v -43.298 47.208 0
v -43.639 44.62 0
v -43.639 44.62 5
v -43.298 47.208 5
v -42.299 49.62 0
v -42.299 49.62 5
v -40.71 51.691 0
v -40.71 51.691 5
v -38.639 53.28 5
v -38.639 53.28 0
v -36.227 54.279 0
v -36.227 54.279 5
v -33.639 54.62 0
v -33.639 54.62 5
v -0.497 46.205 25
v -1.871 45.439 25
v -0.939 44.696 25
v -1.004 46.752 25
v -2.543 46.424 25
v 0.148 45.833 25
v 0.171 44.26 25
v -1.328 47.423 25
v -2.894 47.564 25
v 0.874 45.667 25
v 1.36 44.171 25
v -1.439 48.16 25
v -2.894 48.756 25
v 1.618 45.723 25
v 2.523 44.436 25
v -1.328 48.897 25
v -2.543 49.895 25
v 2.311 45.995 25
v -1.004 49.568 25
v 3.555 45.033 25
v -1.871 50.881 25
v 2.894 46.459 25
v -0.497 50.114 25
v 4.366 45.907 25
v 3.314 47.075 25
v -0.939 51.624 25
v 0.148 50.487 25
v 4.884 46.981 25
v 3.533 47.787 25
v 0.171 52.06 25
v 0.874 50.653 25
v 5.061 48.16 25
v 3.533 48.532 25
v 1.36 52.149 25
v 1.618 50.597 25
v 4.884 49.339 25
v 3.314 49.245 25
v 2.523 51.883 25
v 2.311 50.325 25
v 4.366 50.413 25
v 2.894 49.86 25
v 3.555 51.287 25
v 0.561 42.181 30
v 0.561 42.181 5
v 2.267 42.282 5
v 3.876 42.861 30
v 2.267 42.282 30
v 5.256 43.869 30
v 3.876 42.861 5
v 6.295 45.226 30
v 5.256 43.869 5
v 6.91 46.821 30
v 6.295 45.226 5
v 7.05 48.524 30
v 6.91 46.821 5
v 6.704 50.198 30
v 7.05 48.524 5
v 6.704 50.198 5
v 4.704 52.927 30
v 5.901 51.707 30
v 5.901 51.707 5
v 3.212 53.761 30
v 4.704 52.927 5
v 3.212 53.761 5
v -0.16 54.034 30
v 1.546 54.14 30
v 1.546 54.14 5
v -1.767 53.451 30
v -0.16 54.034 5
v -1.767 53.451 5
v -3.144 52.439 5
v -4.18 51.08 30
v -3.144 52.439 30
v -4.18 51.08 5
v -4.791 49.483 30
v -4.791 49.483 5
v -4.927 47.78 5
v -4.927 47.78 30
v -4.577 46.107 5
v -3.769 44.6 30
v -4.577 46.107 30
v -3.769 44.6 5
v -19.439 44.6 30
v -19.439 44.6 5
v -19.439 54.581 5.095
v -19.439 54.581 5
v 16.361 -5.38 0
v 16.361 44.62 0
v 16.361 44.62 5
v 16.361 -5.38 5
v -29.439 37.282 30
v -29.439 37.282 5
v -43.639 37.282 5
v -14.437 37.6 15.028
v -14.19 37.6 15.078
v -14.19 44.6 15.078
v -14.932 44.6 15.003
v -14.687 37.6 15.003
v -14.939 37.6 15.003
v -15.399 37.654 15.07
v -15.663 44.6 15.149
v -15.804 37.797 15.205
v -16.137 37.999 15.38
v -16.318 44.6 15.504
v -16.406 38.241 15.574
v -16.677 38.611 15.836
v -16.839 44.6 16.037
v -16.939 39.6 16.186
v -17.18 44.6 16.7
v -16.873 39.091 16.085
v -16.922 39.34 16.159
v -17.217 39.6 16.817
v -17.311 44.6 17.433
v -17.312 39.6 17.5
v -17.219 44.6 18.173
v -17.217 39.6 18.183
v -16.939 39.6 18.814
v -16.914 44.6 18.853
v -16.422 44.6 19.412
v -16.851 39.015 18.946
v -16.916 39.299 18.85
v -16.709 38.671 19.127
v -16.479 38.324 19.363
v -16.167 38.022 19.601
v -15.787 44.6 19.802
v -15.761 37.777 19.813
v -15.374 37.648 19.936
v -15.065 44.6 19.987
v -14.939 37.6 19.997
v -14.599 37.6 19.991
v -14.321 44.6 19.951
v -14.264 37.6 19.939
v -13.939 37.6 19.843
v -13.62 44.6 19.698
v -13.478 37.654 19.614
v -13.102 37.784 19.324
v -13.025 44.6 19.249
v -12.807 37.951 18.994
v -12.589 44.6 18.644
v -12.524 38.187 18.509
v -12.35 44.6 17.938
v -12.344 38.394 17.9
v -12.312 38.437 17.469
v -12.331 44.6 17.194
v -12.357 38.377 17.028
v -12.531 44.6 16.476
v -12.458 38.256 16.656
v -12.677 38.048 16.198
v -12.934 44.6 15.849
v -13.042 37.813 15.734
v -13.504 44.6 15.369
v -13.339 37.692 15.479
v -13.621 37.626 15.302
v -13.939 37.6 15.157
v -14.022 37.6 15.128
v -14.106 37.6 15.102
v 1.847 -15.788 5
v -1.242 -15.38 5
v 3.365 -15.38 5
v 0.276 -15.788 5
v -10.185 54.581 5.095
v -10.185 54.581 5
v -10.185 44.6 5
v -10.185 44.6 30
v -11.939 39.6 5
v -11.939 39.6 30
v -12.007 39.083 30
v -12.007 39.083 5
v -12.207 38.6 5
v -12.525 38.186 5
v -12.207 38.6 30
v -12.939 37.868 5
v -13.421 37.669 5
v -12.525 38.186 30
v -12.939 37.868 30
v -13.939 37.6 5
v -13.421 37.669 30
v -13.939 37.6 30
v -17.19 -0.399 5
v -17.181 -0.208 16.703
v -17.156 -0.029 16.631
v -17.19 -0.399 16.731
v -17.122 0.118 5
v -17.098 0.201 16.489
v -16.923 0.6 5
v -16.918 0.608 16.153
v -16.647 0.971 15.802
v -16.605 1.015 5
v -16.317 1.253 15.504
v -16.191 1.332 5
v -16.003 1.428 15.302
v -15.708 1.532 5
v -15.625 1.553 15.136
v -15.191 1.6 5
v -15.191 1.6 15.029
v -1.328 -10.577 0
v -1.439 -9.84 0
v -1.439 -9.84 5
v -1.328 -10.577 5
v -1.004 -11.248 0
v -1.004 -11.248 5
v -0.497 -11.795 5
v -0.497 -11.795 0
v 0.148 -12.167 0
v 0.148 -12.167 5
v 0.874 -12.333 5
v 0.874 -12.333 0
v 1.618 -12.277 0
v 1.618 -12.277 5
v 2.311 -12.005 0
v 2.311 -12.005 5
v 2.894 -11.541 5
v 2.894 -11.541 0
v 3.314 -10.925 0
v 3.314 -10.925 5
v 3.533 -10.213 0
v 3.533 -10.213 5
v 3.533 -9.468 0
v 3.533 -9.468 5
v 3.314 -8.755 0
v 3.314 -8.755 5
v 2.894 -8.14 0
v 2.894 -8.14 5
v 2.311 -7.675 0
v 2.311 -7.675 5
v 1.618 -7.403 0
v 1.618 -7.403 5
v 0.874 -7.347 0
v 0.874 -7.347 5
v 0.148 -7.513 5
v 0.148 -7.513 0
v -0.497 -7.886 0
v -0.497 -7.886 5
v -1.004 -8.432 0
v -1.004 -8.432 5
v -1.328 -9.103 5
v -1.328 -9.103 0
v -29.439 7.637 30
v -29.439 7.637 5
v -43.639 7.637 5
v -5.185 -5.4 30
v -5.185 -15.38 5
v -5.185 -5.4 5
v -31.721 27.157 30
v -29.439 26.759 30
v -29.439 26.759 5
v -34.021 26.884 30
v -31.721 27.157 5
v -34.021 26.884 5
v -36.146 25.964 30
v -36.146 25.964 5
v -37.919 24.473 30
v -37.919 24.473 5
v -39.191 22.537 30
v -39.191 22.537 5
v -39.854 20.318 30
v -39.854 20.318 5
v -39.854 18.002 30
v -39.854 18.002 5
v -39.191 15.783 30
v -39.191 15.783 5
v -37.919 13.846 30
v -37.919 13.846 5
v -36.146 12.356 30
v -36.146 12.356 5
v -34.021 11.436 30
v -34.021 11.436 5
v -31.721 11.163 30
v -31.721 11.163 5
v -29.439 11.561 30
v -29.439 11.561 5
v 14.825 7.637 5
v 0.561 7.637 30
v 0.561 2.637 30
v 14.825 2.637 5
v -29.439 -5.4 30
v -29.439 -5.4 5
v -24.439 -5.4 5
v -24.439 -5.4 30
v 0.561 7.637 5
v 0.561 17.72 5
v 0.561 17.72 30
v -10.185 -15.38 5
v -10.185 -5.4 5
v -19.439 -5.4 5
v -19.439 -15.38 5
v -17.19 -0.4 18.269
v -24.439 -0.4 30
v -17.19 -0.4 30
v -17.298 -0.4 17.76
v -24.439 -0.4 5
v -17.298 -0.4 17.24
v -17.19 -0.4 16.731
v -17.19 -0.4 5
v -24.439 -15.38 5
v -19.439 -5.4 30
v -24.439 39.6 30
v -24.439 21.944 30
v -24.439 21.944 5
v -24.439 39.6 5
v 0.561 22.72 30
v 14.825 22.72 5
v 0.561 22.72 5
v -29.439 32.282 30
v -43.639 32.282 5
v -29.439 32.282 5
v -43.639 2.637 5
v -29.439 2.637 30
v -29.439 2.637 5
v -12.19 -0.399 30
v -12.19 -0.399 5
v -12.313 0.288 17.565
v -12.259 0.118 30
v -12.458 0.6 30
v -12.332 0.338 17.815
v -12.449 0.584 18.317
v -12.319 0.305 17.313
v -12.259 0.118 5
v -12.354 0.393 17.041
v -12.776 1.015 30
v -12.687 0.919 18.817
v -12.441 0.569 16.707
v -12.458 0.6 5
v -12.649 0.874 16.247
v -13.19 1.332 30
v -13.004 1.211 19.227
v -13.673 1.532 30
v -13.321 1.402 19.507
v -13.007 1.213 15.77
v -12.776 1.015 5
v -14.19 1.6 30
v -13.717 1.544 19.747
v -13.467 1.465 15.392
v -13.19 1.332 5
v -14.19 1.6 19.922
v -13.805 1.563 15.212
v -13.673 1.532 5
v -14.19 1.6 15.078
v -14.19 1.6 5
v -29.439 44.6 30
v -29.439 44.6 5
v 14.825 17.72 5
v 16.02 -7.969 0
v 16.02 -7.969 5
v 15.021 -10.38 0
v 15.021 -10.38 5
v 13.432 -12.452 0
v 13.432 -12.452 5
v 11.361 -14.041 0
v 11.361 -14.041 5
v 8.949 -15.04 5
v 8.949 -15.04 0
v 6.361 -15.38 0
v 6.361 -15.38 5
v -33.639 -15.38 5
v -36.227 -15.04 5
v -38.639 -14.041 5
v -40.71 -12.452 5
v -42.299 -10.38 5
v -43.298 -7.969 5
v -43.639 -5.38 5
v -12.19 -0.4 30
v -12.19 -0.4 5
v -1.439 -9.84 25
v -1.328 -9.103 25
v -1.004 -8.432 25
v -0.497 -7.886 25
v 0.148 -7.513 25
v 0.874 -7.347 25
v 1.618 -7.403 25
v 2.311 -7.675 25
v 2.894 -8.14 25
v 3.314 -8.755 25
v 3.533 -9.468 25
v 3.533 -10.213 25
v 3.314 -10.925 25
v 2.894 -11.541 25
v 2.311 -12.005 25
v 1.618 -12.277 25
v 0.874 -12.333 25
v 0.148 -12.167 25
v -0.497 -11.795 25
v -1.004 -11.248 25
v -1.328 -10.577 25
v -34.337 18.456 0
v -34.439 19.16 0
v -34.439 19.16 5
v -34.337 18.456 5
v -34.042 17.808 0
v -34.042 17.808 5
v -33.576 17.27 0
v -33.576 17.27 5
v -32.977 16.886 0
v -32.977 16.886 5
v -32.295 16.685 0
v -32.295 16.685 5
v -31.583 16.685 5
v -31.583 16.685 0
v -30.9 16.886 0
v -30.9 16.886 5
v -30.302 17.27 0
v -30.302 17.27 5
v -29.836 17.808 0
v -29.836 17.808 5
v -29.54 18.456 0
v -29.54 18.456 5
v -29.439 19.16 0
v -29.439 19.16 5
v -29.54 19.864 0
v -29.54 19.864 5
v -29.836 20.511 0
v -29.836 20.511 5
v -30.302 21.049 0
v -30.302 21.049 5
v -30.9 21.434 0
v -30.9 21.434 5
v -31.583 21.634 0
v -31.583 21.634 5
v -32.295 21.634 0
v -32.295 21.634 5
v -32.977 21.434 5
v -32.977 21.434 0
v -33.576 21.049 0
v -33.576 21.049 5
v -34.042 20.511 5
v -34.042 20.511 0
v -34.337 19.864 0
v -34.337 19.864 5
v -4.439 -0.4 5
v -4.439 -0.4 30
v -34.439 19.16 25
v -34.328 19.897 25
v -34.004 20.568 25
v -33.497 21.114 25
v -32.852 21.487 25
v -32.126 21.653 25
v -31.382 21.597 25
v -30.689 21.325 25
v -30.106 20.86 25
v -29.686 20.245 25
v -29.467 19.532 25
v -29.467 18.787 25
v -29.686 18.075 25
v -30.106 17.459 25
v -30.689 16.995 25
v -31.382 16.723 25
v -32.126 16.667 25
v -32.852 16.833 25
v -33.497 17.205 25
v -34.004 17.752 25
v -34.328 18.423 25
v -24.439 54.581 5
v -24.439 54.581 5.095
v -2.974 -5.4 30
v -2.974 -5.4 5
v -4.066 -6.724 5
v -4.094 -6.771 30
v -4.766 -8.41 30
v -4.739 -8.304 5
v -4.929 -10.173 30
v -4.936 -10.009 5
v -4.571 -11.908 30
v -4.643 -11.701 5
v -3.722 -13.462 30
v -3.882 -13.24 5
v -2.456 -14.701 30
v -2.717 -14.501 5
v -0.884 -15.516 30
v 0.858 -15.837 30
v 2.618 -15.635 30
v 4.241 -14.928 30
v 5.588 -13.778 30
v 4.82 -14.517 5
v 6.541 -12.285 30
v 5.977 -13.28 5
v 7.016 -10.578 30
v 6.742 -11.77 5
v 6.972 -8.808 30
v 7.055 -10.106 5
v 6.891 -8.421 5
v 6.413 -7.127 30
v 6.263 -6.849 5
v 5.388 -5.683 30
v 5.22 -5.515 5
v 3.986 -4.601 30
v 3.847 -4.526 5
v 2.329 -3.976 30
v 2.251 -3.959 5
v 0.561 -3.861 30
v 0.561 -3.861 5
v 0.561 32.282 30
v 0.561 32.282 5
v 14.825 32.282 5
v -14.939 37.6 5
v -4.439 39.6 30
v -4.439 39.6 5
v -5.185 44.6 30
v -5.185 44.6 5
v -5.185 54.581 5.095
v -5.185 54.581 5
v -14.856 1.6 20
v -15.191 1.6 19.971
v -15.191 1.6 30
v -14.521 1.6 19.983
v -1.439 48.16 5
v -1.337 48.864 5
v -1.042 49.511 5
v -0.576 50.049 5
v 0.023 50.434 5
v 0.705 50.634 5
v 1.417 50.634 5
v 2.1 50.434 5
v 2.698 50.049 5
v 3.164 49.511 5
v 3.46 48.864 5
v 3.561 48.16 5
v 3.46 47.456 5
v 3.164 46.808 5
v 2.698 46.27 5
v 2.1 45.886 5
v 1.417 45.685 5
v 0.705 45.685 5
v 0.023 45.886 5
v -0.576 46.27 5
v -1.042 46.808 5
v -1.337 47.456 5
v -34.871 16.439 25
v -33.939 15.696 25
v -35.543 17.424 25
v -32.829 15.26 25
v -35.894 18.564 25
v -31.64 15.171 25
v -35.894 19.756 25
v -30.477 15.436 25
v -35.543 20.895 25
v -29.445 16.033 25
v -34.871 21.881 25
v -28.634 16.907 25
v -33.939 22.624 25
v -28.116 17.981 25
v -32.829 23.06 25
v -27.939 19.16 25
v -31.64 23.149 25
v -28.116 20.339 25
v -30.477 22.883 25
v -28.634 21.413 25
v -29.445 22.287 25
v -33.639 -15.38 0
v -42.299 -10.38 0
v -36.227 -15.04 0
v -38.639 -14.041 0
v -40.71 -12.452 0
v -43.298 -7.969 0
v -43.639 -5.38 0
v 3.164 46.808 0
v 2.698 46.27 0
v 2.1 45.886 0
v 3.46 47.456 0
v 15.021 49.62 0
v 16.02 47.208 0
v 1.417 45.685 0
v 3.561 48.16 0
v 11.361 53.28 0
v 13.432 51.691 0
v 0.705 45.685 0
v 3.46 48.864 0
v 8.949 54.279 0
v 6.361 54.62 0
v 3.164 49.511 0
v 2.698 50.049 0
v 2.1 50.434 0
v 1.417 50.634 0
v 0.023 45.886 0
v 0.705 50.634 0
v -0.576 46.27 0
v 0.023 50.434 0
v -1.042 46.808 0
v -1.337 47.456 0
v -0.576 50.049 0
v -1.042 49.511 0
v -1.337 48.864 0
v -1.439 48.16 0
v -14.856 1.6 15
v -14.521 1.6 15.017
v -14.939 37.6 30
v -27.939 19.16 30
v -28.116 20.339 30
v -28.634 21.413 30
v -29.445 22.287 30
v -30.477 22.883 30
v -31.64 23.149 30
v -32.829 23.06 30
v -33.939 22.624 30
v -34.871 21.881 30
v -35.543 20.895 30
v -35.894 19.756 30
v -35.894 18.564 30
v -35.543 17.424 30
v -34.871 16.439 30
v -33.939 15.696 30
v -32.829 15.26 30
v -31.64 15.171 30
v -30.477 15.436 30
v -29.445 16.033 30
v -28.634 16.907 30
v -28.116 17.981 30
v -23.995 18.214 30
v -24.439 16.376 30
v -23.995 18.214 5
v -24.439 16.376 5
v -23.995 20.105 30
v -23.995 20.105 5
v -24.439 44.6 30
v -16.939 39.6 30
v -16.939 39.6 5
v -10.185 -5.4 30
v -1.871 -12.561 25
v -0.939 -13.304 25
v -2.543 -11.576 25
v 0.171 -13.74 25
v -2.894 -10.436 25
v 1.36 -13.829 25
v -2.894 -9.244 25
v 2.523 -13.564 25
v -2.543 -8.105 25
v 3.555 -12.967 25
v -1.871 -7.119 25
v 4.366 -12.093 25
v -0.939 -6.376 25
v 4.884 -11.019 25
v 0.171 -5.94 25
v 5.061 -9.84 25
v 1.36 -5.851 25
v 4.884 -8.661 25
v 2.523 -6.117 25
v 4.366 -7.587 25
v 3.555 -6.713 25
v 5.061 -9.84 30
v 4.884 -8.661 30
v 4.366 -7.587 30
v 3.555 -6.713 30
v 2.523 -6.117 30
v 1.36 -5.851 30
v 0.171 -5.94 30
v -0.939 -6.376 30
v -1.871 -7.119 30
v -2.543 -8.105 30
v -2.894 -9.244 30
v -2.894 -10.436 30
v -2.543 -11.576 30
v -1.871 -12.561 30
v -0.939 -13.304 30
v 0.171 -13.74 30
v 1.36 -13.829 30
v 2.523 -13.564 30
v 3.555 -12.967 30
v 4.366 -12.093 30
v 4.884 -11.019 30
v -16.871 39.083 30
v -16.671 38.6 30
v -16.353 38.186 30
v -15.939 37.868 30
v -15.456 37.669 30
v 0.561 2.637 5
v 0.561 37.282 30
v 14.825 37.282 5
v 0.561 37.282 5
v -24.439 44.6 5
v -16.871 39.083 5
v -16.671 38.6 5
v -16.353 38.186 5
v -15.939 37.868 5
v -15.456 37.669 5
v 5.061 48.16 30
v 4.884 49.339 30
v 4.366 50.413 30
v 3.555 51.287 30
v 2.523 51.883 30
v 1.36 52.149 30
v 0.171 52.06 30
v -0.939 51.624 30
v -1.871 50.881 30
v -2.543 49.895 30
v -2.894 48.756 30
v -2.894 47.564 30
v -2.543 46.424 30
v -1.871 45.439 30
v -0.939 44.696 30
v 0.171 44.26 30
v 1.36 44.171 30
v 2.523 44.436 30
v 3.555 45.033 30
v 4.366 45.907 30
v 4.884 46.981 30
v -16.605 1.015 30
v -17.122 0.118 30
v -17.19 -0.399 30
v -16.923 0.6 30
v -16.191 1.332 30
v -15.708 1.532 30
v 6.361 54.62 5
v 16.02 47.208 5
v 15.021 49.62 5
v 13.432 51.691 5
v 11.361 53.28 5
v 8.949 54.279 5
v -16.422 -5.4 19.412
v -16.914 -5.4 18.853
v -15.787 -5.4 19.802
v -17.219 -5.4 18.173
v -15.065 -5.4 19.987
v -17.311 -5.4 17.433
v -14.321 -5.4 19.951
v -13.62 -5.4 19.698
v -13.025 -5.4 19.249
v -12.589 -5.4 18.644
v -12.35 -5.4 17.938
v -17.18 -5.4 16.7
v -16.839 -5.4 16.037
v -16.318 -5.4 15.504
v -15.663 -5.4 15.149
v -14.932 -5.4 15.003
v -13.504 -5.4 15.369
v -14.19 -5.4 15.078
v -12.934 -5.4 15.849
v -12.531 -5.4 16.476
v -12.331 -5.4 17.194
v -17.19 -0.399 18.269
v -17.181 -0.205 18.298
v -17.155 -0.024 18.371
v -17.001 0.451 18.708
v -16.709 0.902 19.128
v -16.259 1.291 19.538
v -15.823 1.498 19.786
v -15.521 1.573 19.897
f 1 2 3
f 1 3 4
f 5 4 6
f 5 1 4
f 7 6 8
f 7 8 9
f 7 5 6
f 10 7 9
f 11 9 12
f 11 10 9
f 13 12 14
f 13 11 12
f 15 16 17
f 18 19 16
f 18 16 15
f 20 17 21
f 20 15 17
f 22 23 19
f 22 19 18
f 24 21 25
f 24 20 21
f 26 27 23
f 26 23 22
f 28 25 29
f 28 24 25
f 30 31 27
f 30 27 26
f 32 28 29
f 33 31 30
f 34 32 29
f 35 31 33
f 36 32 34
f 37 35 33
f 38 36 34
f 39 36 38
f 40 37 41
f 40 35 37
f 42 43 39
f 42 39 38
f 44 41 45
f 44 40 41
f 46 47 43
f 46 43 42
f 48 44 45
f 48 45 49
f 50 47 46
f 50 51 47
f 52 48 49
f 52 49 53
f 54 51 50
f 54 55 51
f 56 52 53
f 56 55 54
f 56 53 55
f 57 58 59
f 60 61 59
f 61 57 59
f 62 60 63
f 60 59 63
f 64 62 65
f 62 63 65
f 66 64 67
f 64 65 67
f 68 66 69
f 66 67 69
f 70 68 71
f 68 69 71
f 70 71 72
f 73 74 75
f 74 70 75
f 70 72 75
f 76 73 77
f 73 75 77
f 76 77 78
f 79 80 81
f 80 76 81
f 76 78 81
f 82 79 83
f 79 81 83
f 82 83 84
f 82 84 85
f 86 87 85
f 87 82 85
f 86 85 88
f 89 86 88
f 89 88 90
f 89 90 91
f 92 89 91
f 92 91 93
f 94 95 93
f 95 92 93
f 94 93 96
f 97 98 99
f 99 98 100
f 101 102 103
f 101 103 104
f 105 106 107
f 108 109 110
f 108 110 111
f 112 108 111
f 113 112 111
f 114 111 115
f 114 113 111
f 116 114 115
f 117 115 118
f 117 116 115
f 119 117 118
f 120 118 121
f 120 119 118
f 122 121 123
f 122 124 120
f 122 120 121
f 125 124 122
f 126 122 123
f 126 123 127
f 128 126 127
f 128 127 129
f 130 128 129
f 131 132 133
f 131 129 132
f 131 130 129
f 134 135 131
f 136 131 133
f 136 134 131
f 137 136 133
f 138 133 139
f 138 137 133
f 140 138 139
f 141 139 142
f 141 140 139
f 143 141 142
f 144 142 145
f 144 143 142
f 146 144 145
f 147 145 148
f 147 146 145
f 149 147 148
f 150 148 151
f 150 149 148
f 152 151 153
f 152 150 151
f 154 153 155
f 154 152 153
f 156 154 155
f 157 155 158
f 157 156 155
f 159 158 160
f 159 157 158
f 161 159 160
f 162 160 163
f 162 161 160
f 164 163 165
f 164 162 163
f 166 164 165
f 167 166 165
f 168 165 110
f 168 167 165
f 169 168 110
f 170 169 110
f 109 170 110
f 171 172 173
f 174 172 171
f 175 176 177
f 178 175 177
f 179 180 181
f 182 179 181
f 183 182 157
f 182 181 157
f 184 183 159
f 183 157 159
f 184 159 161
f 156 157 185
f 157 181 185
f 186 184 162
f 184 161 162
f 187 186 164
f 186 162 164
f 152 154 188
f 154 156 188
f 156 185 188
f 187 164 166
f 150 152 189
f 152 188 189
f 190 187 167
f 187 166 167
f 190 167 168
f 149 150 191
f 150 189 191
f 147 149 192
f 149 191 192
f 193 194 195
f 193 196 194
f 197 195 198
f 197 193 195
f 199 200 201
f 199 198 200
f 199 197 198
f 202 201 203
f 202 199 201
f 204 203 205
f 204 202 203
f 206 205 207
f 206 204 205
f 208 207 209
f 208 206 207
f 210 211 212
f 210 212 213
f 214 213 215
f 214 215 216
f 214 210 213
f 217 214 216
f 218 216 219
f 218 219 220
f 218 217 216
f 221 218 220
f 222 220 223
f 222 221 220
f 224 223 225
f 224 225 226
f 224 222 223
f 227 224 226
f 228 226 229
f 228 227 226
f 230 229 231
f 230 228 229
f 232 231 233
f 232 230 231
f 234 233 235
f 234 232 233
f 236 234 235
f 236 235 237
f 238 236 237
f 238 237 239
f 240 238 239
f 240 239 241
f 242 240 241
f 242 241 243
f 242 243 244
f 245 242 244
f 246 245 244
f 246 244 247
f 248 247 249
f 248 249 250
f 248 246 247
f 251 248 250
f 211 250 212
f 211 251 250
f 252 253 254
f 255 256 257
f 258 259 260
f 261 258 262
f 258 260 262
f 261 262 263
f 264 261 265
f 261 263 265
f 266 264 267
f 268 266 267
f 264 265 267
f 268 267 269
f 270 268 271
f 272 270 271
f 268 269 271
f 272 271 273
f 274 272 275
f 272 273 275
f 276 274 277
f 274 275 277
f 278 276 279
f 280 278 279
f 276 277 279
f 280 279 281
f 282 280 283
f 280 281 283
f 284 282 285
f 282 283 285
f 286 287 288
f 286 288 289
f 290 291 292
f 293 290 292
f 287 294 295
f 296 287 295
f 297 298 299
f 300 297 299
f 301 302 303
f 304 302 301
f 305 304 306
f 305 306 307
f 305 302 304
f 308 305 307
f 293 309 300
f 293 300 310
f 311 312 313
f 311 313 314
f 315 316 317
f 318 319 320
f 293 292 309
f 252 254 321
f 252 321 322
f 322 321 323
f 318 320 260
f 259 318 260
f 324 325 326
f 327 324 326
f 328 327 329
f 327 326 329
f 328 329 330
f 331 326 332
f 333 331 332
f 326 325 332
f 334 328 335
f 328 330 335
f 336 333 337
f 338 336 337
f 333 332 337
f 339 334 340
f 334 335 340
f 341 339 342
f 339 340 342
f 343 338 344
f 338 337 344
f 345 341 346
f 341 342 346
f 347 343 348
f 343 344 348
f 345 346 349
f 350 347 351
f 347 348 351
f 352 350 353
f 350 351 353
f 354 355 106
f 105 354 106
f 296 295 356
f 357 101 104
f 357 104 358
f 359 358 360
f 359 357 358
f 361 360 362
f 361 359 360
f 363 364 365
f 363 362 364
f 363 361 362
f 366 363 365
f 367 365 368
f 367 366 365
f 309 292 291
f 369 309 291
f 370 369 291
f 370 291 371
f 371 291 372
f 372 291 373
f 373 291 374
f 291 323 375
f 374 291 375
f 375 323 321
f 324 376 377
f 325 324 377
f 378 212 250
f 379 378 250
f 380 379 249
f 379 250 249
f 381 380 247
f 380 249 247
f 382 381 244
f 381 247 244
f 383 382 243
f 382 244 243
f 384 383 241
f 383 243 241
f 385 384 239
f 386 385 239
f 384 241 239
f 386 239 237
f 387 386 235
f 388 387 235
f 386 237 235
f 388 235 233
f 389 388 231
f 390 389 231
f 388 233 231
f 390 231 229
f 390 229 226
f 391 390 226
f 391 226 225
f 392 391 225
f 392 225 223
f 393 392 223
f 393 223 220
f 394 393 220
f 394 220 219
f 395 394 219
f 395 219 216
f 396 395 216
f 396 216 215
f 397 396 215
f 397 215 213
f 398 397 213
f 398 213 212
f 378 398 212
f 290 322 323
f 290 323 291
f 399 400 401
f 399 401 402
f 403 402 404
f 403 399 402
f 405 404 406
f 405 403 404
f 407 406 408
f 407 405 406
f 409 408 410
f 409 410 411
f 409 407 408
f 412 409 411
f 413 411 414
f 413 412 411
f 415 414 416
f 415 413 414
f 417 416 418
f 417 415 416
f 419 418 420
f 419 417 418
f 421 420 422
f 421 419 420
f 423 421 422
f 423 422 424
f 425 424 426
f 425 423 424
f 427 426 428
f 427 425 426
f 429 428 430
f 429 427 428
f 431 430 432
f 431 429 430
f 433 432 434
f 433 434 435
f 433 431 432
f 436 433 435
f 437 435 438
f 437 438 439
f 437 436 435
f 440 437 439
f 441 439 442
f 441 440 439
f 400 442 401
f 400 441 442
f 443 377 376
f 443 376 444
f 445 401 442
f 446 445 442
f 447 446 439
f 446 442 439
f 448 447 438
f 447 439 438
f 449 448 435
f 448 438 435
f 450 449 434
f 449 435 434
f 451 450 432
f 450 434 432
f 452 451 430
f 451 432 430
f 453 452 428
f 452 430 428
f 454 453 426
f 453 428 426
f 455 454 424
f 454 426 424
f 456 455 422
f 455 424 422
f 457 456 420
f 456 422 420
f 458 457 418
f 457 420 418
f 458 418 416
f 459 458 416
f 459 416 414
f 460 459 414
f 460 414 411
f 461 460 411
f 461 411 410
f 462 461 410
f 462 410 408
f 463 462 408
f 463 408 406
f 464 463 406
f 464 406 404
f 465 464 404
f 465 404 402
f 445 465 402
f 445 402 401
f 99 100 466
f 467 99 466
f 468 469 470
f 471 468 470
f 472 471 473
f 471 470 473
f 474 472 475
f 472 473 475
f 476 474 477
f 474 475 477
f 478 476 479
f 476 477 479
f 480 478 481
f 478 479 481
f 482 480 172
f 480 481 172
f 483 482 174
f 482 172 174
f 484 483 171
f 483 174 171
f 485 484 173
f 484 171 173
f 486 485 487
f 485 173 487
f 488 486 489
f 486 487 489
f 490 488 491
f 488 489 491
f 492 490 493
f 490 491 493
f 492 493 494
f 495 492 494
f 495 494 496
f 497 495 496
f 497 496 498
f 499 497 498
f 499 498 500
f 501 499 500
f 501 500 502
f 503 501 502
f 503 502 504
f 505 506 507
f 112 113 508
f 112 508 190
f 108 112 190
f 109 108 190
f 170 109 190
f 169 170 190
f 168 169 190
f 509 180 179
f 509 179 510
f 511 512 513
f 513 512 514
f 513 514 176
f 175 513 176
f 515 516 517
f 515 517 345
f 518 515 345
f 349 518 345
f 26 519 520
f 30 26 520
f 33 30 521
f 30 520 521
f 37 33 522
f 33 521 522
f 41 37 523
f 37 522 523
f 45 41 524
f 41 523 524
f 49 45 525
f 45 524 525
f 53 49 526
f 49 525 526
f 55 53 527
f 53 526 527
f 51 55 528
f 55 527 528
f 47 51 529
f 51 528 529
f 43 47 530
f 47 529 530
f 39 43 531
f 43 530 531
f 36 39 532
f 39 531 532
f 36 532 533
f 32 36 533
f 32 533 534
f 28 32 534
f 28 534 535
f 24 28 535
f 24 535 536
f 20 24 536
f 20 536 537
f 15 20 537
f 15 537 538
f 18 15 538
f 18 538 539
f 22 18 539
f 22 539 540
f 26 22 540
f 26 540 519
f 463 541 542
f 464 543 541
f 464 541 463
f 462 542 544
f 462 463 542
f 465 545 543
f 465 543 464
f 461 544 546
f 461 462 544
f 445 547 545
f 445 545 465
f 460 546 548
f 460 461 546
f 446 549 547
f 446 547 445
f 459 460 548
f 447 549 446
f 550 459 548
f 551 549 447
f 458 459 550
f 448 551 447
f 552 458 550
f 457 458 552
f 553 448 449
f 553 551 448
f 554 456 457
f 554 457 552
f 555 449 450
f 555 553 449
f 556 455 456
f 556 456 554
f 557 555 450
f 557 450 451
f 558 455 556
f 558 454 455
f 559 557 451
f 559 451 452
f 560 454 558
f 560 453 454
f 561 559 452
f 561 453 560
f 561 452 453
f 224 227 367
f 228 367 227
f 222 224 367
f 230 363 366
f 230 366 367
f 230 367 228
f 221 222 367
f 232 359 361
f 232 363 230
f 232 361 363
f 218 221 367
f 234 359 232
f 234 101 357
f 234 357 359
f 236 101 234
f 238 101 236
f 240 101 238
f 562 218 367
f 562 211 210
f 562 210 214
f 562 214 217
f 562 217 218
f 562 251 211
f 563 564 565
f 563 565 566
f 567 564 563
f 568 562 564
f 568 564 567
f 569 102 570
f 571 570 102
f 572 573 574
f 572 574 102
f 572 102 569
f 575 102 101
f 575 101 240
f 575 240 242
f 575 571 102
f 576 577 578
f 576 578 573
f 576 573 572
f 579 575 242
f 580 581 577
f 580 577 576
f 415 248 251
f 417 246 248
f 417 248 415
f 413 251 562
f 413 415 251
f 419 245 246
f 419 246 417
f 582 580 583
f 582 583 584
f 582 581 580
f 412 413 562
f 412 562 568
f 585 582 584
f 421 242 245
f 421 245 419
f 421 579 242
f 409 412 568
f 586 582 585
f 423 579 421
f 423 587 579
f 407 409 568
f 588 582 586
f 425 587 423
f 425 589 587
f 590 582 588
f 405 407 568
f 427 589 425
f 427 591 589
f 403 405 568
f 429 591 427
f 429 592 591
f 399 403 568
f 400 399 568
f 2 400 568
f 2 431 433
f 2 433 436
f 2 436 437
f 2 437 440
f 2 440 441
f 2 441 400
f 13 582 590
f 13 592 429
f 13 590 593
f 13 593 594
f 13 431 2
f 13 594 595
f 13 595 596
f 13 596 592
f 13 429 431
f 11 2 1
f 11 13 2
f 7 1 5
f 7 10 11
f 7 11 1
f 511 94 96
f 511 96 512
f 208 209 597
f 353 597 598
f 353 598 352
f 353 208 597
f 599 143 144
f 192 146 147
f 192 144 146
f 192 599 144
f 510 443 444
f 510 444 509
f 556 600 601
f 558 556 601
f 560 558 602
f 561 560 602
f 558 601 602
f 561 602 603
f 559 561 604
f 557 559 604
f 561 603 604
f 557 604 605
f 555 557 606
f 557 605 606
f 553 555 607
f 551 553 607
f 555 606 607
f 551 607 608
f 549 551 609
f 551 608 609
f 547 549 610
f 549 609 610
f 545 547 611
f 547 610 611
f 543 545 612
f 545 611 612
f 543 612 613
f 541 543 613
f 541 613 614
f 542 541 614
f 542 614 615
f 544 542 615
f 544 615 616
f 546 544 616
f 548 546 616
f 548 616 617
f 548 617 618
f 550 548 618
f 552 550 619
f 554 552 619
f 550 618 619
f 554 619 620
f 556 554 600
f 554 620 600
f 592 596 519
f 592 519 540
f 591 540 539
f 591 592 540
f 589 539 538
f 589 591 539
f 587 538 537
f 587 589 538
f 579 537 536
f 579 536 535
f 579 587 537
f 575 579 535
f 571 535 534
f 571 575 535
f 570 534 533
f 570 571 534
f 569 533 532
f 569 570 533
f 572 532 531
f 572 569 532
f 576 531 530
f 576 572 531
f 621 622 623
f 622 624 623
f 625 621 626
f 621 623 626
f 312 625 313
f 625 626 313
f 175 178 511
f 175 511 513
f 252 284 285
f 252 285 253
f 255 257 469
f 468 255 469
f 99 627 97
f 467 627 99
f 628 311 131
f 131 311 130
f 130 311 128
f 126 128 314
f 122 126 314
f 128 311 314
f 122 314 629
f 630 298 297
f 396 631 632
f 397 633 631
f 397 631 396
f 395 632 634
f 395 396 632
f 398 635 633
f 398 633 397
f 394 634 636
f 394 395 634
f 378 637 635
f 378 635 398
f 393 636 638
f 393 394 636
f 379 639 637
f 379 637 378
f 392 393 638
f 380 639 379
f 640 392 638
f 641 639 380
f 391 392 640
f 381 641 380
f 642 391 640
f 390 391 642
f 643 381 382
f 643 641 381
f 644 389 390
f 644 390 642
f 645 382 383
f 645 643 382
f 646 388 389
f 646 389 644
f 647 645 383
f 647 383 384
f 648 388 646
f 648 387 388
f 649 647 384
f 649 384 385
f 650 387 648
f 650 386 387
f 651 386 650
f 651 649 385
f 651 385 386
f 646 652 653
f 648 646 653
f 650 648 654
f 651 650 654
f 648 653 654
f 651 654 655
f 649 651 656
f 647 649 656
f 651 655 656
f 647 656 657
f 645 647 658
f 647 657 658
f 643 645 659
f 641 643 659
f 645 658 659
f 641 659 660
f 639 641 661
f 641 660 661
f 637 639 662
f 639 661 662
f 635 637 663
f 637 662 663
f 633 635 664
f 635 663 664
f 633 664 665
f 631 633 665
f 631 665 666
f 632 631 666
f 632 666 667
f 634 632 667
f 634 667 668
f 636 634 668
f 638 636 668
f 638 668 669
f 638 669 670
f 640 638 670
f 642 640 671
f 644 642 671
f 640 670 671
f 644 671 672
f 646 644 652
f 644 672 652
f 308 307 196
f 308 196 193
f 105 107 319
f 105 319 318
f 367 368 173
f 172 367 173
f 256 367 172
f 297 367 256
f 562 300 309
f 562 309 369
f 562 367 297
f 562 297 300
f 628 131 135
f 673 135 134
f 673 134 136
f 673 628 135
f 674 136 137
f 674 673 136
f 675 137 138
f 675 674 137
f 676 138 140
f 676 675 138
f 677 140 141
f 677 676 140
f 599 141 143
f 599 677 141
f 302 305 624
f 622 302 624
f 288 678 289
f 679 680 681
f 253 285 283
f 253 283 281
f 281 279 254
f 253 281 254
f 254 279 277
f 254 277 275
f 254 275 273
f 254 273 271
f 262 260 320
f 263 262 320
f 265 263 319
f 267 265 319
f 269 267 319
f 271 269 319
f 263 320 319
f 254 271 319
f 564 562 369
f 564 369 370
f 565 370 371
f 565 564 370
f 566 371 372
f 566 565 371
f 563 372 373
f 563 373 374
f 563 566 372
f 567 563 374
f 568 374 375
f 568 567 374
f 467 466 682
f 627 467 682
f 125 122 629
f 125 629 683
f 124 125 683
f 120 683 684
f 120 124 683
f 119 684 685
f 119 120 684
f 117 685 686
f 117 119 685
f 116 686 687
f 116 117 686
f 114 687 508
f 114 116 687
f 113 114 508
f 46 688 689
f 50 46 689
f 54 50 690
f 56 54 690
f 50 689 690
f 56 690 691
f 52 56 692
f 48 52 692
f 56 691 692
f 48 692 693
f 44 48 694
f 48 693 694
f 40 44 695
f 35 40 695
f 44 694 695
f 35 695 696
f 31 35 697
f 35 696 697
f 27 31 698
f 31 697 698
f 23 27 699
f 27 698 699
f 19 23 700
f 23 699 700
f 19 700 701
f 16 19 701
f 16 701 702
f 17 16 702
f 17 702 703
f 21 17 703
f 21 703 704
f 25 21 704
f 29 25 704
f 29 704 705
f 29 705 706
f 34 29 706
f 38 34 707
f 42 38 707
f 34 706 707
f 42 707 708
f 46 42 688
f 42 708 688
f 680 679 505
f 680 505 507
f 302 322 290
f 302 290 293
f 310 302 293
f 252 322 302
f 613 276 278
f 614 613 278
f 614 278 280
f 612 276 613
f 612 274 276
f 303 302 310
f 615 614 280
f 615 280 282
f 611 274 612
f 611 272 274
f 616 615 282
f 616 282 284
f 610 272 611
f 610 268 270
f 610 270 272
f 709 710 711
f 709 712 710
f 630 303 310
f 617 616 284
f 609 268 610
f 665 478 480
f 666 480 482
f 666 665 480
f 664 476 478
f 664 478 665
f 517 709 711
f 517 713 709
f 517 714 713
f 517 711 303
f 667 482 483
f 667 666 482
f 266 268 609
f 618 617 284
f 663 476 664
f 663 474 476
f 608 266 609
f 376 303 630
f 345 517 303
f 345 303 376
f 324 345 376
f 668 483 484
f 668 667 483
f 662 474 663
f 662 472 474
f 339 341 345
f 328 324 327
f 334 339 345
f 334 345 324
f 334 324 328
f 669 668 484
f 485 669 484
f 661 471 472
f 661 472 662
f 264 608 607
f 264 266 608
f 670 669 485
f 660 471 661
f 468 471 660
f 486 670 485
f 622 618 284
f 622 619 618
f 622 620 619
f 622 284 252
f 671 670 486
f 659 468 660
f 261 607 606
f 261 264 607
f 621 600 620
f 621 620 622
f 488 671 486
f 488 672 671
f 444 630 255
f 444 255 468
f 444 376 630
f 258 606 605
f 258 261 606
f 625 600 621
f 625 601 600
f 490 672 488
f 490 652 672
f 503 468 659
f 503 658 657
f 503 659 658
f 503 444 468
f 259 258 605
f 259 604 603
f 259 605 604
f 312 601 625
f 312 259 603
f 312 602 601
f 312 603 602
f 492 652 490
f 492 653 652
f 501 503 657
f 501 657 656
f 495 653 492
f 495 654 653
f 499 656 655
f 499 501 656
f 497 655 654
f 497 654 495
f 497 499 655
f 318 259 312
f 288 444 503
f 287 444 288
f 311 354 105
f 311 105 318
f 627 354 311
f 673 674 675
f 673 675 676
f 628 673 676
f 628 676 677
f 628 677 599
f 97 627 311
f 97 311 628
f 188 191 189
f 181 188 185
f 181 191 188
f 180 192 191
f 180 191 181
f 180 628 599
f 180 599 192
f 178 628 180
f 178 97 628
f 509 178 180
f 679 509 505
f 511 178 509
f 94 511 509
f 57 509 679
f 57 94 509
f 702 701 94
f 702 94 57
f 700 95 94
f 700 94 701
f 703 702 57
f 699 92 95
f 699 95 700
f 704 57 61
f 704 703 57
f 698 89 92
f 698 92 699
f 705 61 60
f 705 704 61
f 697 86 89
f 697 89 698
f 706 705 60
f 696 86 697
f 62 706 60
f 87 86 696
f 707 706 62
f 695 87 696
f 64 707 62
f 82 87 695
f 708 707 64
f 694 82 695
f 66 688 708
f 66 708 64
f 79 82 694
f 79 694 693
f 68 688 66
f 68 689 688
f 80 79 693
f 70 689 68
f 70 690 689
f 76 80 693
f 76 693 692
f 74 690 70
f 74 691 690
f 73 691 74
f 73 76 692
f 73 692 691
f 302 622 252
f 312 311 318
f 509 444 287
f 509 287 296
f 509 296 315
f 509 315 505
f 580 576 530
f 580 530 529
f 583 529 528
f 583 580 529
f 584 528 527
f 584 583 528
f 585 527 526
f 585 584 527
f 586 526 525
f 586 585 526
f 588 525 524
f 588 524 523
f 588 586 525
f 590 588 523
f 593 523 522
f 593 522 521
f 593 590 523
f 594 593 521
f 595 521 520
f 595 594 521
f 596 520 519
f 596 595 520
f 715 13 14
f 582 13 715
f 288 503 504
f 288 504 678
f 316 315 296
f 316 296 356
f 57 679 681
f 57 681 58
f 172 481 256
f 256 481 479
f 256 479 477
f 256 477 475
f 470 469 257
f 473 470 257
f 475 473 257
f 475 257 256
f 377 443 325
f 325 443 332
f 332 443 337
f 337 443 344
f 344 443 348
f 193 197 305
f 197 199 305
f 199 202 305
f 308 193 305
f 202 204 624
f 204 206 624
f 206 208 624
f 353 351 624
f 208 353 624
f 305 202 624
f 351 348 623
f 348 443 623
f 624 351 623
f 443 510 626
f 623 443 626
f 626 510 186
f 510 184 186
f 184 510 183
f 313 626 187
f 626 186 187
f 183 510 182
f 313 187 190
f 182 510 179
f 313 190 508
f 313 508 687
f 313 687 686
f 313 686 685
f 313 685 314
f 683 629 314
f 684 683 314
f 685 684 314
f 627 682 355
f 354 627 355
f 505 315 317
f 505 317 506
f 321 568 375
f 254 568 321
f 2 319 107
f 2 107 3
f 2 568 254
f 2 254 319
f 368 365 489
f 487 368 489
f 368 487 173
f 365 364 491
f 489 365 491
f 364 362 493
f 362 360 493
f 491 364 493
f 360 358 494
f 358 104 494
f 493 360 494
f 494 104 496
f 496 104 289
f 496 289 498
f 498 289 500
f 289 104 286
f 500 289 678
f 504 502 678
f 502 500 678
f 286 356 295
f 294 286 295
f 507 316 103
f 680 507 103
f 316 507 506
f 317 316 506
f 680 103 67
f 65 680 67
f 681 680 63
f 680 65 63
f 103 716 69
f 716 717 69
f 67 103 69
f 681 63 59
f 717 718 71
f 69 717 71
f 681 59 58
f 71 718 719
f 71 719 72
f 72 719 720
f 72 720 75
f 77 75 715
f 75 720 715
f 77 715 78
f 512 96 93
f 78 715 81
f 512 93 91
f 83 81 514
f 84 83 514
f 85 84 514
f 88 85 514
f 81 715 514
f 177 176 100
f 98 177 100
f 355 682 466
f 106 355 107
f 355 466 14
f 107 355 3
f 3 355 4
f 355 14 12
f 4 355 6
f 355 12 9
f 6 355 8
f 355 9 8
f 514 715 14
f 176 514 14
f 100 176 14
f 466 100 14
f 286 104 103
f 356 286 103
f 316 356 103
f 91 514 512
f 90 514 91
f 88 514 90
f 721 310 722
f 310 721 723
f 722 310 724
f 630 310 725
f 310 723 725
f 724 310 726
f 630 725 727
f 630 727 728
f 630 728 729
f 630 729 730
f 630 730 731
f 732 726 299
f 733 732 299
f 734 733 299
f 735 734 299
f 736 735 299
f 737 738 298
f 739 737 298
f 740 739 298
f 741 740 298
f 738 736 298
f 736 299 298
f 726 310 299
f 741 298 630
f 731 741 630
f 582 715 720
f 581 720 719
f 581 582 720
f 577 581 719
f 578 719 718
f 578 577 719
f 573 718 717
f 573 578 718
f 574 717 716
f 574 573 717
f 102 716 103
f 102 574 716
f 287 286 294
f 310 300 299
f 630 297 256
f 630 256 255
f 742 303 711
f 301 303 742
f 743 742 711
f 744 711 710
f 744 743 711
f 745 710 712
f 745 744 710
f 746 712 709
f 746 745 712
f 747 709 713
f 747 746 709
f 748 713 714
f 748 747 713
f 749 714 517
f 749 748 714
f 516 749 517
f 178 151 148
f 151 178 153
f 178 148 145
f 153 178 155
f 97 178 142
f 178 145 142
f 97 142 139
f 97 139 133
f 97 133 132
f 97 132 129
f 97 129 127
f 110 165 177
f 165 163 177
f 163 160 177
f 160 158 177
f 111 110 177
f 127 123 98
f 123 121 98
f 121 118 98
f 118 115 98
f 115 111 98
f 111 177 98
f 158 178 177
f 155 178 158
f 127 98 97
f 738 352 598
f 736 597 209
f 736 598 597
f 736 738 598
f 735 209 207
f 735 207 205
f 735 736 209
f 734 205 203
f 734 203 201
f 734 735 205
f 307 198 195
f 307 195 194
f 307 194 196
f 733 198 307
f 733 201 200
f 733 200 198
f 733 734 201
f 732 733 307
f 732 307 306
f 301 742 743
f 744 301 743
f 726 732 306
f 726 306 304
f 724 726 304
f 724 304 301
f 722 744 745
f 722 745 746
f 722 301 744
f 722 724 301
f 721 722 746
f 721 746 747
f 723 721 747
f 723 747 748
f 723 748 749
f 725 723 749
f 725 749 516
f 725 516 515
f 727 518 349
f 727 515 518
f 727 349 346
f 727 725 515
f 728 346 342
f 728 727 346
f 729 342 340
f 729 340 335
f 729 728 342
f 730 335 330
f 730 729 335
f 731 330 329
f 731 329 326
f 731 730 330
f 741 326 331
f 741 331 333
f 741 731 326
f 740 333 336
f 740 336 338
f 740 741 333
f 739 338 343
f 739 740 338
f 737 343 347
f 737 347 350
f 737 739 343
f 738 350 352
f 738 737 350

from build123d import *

# Parameters (mm, degrees)
SKETCH1_R                = 2.5
BOSS_EXTRUDE1_DEPTH      = 5
SKETCH3_W                = 20
SKETCH3_H                = 40
BOSS_EXTRUDE5_DEPTH      = 25
CUT_EXTRUDE2_DEPTH       = 75.20598847
CUT_EXTRUDE2_DEPTH_BACK  = 75.20598847
CUT_EXTRUDE_THIN13_DEPTH = 75.484252037
SKETCH8_W                = 5
SKETCH8_H                = 25
BOSS_EXTRUDE6_DEPTH      = 2
FILLET3_R                = 2
SKETCH9_W                = 5
SKETCH9_H                = 25
BOSS_EXTRUDE7_DEPTH      = 2
FILLET4_R                = 2
SKETCH11_R               = 4.5
CUT_EXTRUDE4_DEPTH       = 25
SKETCH12_R               = 6
SKETCH12_R_2             = 8
BOSS_EXTRUDE8_DEPTH      = 25
SKETCH13_R               = 2.5
CUT_EXTRUDE5_DEPTH       = 28
SKETCH14_R               = 4
CUT_EXTRUDE6_DEPTH       = 5
CUT_EXTRUDE7_DEPTH       = 18
CUT_EXTRUDE7_DEPTH_BACK  = 70
SKETCH15_R               = 2.5


with BuildPart() as part:
    # Sketch1 → Boss-Extrude1 (new body)
    with BuildSketch(Plane.XY):
        with BuildLine():
            Line((-33.639154819, 54.619565217), (6.360845181, 54.619565217))
            ThreePointArc((6.360845181, 54.619565217), (13.431912992, 51.690633029), (16.360845181, 44.619565217))
            Line((16.360845181, 44.619565217), (16.360845181, -5.380434783))
            ThreePointArc((16.360845181, -5.380434783), (13.431912992, -12.451502594), (6.360845181, -15.380434783))
            Line((6.360845181, -15.380434783), (-33.639154819, -15.380434783))
            ThreePointArc((-33.639154819, -15.380434783), (-40.710222631, -12.451502594), (-43.639154819, -5.380434783))
            Line((-43.639154819, -5.380434783), (-43.639154819, 44.619565217))
            ThreePointArc((-43.639154819, 44.619565217), (-40.710222631, 51.690633029), (-33.639154819, 54.619565217))
        make_face()
        with Locations((1.061250856, 48.159869042)):
            Circle(SKETCH1_R, mode=Mode.SUBTRACT)
        with Locations(Location((1.061250856, -9.840130958, 0), (0, 0, 180))):
            Circle(SKETCH1_R, mode=Mode.SUBTRACT)
        with Locations((-31.938749144, 19.159869042)):
            Circle(SKETCH1_R, mode=Mode.SUBTRACT)
    extrude(amount=BOSS_EXTRUDE1_DEPTH)

    # Sketch3 → Boss-Extrude5 (add)
    with BuildSketch(Plane.XY.offset(5)):
        Polygon((-24.438749144, 44.600432852), (-29.438749144, 44.600432852), (-29.438749144, 37.28199121), (-43.639154819, 37.28199121), (-43.639154819, 32.28199121), (-29.438749144, 32.28199121), (-29.438749144, 7.637328911), (-43.639154819, 7.637328911), (-43.639154819, 2.637328911), (-29.438749144, 2.637328911), (-29.438749144, -5.399567148), (-24.438749144, -5.399567148), (-24.438749144, -15.380434783), (-19.438749144, -15.380434783), (-19.438749144, -5.399567148), (-10.184597354, -5.399567148), (-10.184597354, -15.380434783), (-5.184597354, -15.380434783), (-5.184597354, -5.399567148), (0.561250856, -5.399567148), (0.561250856, 2.637328911), (14.825245568, 2.637328911), (14.825245568, 7.637328911), (0.561250856, 7.637328911), (0.561250856, 17.719700958), (14.825245568, 17.719700958), (14.825245568, 22.719700958), (0.561250856, 22.719700958), (0.561250856, 32.28199121), (14.825245568, 32.28199121), (14.825245568, 37.28199121), (0.561250856, 37.28199121), (0.561250856, 44.600432852), (-5.184597354, 44.600432852), (-5.184597354, 54.581300487), (-10.184597354, 54.581300487), (-10.184597354, 44.600432852), (-19.438749144, 44.600432852), (-19.438749144, 54.581300487), (-24.438749144, 54.581300487), align=None)
        with Locations((-14.438749144, 19.600432852)):
            Rectangle(SKETCH3_W, SKETCH3_H, mode=Mode.SUBTRACT)
    extrude(amount=BOSS_EXTRUDE5_DEPTH)

    # Sketch5 → Cut-Extrude2 (cut, two sides: drawn at the far end of the back side and taken through both)
    with BuildSketch(Plane.XZ.offset(-2.637328911).offset(-CUT_EXTRUDE2_DEPTH_BACK)):
        Polygon((-43.639154819, 30), (-43.639154819, 5), (-29.438749144, 30), align=None)
        Polygon((14.825245568, 30), (0.561250856, 30), (14.825245568, 5), align=None)
    extrude(amount=CUT_EXTRUDE2_DEPTH + CUT_EXTRUDE2_DEPTH_BACK, mode=Mode.SUBTRACT)

    # Sketch7 → Cut-Extrude-Thin13 (cut, through all)
    with BuildSketch(Plane.ZY.offset(24.438749144)):
        Polygon((30, 44.600432852), (5, 54.619565217), (8.72002984, 63.901880553), (33.72002984, 53.882748188), align=None)
        Polygon((5, -15.380434783), (30, -5.399567148), (33.707778838, -14.686782882), (8.707778838, -24.667650517), align=None)
    extrude(amount=-CUT_EXTRUDE_THIN13_DEPTH, mode=Mode.SUBTRACT)

    # Sketch8 → Boss-Extrude6 (add)
    with BuildSketch(Plane.XZ.offset(-39.600432852)):
        with Locations((-14.438749144, 17.5)):
            Rectangle(SKETCH8_W, SKETCH8_H)
    extrude(amount=BOSS_EXTRUDE6_DEPTH)

    # Fillet3
    fillet3_edges = [part.edges().sort_by_distance(p)[0] for p in [
        (-16.938749144, 37.600432852, 17.5),
        (-11.938749144, 37.600432852, 17.5),
    ]]
    fillet(fillet3_edges, radius=FILLET3_R - 0.0001)  # a hair under: the kernel refuses the full size

    # Sketch9 → Boss-Extrude7 (add)
    with BuildSketch(Plane(origin=(0, -0.399567148, 0), x_dir=(1, 0, 0), z_dir=(0, 1, 0))):
        with Locations((-14.690486301, -17.5)):
            Rectangle(SKETCH9_W, SKETCH9_H)
    extrude(amount=BOSS_EXTRUDE7_DEPTH)

    # Fillet4
    fillet4_edges = [part.edges().sort_by_distance(p)[0] for p in [
        (-12.190486301, 1.600432852, 17.5),
        (-17.190486301, 1.600432852, 17.5),
    ]]
    fillet(fillet4_edges, radius=FILLET4_R - 0.0001)  # a hair under: the kernel refuses the full size

    # Sketch11 → Cut-Extrude4 (cut)
    with BuildSketch(Plane.XY.offset(30)):
        with Locations((-31.938749144, 19.159869042)):
            Circle(SKETCH11_R)
    extrude(amount=-CUT_EXTRUDE4_DEPTH, mode=Mode.SUBTRACT)

    # Sketch12 → Boss-Extrude8 (add)
    with BuildSketch(Plane.XY.offset(5)):
        with Locations((1.061250856, 48.159869042)):
            Circle(SKETCH12_R)
        with Locations((1.061250856, -9.840130958)):
            Circle(SKETCH12_R)
        with Locations((-31.938749144, 19.159869042)):
            Circle(SKETCH12_R_2)
    extrude(amount=BOSS_EXTRUDE8_DEPTH)

    # Sketch13 → Cut-Extrude5 (cut)
    with BuildSketch(Plane(origin=(0, 0, 0), x_dir=(-1, 0, 0), z_dir=(0, 0, -1))):
        with Locations((31.938749144, 19.159869042)):
            Circle(SKETCH13_R)
        with Locations((-1.061250856, -9.840130958)):
            Circle(SKETCH13_R)
        with Locations((-1.061250856, 48.159869042)):
            Circle(SKETCH13_R)
    extrude(amount=-CUT_EXTRUDE5_DEPTH, mode=Mode.SUBTRACT)

    # Sketch14 → Cut-Extrude6 (cut)
    with BuildSketch(Plane.XY.offset(30)):
        with Locations((-31.938749144, 19.159869042)):
            Circle(SKETCH14_R)
        with Locations((1.061250856, 48.159869042)):
            Circle(SKETCH14_R)
        with Locations((1.061250856, -9.840130958)):
            Circle(SKETCH14_R)
    extrude(amount=-CUT_EXTRUDE6_DEPTH, mode=Mode.SUBTRACT)

    # Sketch15 → Cut-Extrude7 (cut, two sides: drawn at the far end of the back side and taken through both)
    with BuildSketch(Plane(origin=(0, 44.600432852, 0), x_dir=(1, 0, 0), z_dir=(0, 1, 0)).offset(-CUT_EXTRUDE7_DEPTH_BACK)):
        with Locations(Location((-14.811673249, -17.5, 0), (0, 0, 75.612724185))):
            Circle(SKETCH15_R)
    extrude(amount=CUT_EXTRUDE7_DEPTH + CUT_EXTRUDE7_DEPTH_BACK, mode=Mode.SUBTRACT)


solid = part.part
